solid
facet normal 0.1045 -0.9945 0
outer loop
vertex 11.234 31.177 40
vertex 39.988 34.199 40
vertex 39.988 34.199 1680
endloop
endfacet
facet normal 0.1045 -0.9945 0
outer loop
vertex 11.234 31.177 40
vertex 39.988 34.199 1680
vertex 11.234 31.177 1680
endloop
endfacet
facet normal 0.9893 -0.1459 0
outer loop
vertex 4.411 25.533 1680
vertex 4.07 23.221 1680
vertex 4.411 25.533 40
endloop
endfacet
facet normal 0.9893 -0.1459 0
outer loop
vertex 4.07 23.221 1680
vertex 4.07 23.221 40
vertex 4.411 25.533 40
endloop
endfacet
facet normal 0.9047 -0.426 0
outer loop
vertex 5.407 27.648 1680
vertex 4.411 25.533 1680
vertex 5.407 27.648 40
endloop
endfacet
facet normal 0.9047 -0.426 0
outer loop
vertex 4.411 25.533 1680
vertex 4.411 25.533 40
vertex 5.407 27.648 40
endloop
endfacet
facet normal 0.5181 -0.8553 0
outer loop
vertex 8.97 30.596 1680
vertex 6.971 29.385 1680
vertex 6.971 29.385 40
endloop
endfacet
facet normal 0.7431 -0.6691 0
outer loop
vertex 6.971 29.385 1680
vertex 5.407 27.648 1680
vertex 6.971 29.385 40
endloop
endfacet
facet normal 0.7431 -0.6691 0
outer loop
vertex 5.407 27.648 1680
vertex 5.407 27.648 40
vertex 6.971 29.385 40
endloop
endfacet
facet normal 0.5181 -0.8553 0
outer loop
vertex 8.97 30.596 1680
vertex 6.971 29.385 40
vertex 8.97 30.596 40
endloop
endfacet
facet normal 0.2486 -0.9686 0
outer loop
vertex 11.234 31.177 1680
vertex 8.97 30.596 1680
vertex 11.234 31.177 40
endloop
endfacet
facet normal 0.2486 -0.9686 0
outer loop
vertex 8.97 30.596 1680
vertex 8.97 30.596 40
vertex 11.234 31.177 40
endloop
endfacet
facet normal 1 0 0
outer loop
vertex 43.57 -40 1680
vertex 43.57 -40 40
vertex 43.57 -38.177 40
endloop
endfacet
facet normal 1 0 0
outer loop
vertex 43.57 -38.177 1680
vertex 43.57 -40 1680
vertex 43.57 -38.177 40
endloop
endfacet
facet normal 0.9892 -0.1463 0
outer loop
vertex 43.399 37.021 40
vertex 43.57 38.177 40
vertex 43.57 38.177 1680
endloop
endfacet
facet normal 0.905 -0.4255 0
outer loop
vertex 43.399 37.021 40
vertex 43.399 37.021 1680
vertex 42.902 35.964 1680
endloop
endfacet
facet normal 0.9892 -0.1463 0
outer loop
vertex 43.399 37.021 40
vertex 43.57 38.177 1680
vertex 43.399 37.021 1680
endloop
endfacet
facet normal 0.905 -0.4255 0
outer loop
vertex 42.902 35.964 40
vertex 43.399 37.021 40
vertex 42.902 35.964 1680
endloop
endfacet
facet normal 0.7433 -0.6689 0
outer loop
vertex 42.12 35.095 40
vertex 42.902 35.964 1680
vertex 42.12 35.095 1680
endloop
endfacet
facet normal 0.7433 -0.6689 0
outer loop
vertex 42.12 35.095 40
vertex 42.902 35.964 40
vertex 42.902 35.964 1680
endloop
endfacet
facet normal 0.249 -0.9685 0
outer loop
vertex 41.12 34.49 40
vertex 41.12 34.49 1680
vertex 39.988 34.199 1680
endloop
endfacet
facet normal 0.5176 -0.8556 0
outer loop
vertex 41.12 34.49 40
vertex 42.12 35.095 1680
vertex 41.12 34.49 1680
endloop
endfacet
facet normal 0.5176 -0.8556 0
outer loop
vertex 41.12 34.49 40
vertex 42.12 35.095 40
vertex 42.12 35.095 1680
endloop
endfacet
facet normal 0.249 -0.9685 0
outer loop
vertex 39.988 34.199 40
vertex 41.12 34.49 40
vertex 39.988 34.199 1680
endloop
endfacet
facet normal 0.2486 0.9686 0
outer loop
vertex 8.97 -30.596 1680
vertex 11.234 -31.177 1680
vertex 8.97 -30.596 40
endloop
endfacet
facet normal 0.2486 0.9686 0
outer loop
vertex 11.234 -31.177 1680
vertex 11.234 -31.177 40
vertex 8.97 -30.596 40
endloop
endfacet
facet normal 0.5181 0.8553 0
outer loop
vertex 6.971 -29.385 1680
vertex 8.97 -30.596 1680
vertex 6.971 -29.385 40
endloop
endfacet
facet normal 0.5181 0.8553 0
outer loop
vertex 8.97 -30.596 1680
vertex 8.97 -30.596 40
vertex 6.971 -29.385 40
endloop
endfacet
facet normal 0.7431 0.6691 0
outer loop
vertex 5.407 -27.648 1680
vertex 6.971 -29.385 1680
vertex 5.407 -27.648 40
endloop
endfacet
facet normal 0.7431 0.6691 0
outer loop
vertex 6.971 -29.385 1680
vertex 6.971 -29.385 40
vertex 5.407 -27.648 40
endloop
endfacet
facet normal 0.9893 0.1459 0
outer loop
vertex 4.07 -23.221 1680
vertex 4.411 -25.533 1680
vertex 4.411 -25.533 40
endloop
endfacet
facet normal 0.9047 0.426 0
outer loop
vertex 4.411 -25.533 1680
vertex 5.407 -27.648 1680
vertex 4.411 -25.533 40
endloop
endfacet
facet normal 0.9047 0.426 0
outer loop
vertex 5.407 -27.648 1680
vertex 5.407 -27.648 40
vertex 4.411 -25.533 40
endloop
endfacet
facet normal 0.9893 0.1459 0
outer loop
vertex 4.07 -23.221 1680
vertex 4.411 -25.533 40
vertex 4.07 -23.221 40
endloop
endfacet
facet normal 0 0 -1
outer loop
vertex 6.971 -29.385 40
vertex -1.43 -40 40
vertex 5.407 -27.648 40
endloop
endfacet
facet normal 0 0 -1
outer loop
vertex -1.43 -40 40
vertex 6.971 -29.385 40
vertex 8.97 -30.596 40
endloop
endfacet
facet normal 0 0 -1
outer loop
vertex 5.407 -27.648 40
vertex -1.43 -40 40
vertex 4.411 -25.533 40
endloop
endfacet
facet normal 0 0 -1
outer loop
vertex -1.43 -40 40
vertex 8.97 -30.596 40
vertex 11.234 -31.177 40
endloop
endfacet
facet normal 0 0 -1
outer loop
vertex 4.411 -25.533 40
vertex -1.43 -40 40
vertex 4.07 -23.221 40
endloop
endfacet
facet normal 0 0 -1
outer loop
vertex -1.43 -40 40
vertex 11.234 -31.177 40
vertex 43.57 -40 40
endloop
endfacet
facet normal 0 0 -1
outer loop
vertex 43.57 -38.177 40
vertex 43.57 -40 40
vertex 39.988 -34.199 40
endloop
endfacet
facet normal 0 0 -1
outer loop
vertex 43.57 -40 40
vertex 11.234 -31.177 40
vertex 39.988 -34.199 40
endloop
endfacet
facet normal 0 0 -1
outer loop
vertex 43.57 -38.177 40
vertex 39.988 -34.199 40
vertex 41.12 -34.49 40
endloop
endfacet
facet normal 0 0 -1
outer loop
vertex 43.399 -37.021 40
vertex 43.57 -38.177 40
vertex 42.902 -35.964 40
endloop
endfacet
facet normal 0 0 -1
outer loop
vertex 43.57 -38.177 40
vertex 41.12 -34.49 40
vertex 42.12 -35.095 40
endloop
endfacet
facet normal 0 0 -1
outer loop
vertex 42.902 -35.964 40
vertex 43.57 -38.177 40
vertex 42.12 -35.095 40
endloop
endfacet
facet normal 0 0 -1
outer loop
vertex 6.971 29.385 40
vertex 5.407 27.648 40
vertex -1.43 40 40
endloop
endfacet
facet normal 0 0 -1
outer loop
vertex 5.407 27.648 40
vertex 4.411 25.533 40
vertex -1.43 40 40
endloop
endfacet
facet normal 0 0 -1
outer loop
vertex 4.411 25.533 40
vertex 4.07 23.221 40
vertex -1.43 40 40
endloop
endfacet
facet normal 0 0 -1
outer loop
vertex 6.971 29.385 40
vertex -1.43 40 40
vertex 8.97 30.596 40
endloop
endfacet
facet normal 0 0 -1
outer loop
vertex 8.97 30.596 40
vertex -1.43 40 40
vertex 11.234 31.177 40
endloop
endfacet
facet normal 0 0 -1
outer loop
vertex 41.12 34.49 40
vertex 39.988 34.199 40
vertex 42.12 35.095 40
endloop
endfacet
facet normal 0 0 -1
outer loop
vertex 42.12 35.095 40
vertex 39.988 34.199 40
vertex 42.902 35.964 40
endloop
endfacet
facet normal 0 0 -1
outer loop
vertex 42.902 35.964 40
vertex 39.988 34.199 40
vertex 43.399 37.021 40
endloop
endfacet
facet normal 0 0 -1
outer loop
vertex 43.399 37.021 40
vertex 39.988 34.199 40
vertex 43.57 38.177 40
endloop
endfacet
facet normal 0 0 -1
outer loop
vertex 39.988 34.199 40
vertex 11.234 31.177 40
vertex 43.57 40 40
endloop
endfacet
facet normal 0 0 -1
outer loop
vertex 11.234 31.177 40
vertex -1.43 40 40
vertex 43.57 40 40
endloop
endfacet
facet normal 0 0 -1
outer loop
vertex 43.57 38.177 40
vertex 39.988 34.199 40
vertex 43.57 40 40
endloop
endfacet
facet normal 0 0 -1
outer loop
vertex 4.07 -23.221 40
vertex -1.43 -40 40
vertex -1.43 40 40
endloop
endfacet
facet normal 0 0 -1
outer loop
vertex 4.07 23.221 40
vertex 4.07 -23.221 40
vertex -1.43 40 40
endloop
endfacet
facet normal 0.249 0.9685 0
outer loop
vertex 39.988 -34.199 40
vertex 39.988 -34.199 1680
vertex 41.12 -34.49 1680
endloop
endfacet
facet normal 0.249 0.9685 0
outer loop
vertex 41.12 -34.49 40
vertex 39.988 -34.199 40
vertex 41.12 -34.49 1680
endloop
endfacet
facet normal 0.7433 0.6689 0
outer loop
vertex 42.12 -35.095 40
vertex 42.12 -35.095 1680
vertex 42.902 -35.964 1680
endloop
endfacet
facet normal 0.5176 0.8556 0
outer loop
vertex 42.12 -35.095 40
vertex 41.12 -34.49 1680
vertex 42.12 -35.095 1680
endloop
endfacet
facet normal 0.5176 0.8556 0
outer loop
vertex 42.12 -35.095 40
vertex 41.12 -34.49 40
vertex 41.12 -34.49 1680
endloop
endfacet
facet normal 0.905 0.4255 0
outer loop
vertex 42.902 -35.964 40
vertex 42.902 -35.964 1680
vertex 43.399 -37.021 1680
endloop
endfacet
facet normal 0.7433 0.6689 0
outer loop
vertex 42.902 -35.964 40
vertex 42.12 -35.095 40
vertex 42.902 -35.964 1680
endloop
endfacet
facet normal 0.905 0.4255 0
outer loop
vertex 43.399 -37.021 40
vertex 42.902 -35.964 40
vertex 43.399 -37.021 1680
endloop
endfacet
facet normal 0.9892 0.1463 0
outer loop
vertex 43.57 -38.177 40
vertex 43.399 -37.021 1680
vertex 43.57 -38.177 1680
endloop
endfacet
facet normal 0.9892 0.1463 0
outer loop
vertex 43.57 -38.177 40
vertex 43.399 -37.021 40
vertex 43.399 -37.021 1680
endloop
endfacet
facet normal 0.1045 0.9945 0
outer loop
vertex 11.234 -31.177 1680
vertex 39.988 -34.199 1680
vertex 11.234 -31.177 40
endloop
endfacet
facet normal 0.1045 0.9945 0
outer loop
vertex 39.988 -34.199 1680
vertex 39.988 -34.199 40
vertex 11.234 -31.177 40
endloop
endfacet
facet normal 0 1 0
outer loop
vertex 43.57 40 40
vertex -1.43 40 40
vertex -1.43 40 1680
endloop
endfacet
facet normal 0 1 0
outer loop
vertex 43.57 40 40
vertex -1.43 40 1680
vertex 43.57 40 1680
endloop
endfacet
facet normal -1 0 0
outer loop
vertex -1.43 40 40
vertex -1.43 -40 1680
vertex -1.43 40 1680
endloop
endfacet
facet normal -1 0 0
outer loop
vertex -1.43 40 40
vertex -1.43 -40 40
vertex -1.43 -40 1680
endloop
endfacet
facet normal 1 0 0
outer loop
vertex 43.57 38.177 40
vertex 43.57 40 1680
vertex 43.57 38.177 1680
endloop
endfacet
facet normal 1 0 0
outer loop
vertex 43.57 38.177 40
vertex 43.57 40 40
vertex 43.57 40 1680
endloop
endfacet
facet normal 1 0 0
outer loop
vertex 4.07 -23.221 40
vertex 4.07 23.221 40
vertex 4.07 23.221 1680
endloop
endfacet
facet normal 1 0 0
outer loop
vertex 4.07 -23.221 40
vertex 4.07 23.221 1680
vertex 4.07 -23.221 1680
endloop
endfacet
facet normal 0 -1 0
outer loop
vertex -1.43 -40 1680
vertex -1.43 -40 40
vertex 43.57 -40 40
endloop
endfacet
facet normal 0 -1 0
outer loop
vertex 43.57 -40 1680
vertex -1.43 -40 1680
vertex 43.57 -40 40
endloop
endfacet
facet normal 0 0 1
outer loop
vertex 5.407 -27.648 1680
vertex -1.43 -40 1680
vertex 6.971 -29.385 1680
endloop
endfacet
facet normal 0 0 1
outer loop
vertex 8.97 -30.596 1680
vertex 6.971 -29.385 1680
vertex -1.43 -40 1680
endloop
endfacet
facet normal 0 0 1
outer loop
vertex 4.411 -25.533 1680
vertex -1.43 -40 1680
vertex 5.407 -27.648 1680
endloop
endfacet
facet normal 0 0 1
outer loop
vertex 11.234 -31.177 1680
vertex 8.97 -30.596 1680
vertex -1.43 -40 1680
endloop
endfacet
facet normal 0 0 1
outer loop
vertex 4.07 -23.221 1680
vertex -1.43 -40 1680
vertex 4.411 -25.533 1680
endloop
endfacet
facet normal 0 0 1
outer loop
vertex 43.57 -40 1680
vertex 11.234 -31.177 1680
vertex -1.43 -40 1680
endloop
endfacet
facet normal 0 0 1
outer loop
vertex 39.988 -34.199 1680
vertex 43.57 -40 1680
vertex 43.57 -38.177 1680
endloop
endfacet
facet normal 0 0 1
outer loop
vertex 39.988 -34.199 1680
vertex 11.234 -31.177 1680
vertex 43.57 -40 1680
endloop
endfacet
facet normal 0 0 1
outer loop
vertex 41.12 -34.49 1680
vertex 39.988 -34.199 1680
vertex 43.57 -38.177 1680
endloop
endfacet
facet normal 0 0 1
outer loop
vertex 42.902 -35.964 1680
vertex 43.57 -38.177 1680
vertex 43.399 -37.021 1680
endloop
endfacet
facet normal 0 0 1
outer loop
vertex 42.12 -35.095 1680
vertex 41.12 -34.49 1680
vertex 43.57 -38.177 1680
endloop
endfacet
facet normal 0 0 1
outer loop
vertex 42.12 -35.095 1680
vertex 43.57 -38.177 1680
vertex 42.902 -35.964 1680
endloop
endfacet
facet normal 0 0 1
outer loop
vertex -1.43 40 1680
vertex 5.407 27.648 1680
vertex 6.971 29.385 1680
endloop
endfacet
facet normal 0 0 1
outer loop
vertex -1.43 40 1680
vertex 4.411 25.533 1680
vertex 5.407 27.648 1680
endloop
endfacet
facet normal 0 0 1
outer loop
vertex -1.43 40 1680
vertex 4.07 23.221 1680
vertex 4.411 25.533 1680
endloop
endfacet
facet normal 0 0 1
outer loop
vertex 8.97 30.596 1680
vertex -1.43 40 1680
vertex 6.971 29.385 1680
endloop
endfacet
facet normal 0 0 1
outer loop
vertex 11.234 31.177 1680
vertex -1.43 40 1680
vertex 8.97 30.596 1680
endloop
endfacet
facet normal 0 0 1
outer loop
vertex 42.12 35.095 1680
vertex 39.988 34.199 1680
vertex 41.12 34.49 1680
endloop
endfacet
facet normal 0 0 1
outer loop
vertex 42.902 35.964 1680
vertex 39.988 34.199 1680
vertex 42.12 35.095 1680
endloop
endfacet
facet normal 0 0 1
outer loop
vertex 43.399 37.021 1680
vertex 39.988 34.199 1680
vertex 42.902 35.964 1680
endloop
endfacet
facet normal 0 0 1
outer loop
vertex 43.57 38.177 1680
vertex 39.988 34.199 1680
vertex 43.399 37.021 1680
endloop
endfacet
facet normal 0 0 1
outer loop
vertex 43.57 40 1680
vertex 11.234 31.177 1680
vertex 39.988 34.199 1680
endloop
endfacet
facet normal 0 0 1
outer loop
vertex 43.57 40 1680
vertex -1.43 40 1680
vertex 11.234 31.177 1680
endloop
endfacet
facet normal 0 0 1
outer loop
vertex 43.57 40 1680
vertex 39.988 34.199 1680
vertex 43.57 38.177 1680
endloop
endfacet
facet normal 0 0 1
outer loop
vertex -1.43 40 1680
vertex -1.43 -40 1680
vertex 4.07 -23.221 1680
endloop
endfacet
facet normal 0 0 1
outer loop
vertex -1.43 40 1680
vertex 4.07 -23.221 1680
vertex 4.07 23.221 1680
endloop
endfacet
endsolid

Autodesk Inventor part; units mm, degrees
ref_plane "Начальная плоскость" through (0, 0, 40) normal (0, 0, 1) x (1, 0, 0)
ref_plane "Конечная плоскость" through (0, 0, 1680) normal (0, 0, 1) x (1, 0, 0)
sketch "Эскиз" plane through (0, 0, 0) normal (0, 0, 1) x (1, 0, 0)
  line L0 (-1.43, 0) -> (-1.43, 40)
  line L1 (-1.43, 40) -> (43.57, 40)
  line L2 (43.57, 40) -> (43.57, 38.1774)
  line L3 (39.9881, 34.1993) -> (11.2338, 31.1771)
  line L4 (4.07, 23.221) -> (4.07, 0)
  line L5 (4.07, 0) -> (-1.43, 0) construction
  line L6 (23.82, 40) -> (23.82, 32.5) construction
  line L7 (43.57, 34.5758) -> (43.57, 32.5) construction
  line L8 (43.57, 32.5) -> (23.82, 32.5) construction
  line L9 (0, 15) -> (0, -27) construction
  line L10 (-5.539, 0) -> (16.0067, 0) construction
  line L11 (-1.43, 0) -> (-1.43, -40)
  line L12 (-1.43, -40) -> (43.57, -40)
  line L13 (43.57, -40) -> (43.57, -38.1774)
  line L14 (39.9881, -34.1993) -> (11.2338, -31.1771)
  line L15 (4.07, -23.221) -> (4.07, 0)
  arc A0 (11.2338, 31.1771) -> (4.07, 23.221) centre (12.07, 23.221) ccw
  arc A1 (4.07, -23.221) -> (11.2338, -31.1771) centre (12.07, -23.221) ccw
  arc A2 (39.9881, 34.1993) -> (43.57, 38.1774) centre (39.57, 38.1774) ccw
  arc A3 (43.57, -38.1774) -> (39.9881, -34.1993) centre (39.57, -38.1774) ccw
  line L16 (0, 56) -> (0, -56) construction
  line L17 (-15.5135, 0) -> (54.308, 0) construction
  point P0 (4.07, 30.4242)
  point P1 (43.57, -34.5758)
  point P2 (4.07, -30.4242)
  point P3 (23.82, -40)
  point P4 (23.82, -32.5)
  dimension "d0" = 5.5
  dimension "d1" = 40
  dimension "d2" = 45
  dimension "d3" = 7.5
  dimension "d4" = 19.75
  dimension "d5" = 2.0758
  dimension "d23" = 8
  dimension "d24" = 4
  dimension "d25" = 1.43
extrude "Тело" add sketch "Эскиз" along normal up to surface (1640 mm away) from surface at 40
sketch "Sketch3" plane through (0, 0, 0) normal (0, 0, 1) x (1, 0, 0)
  line L0 (0, 0) -> (10, 0)
ref_plane "Work Plane3" through (0, 0, 0) normal (0, -1, 0) x (1, 0, 0)
sketch "Sketch4" plane through (0, 0, 0) normal (0, -1, 0) x (1, 0, 0)
  line L0 (-2, 40) -> (12, 40)
  line L1 (-2, 1680) -> (12, 1680)
  dimension "d29" = 1640
ref_plane "РабПлоскость4" through (-1.43, 1750, 40) normal (0, 0, -1) x (-1, 0, 0)
split "Разделение1" plane through (-1.43, 1750, 40) removes the side toward (0, 0, -1)
ref_plane "РабПлоскость5" through (-1.43, -1320, 1680) normal (0, 0, 1) x (1, 0, 0)
split "Разделение2" plane through (-1.43, -1320, 1680) removes the side toward (0, 0, 1)
equation "\"d0\" = G_T"
equation "\"d1\" = 0.5 * G_H"
equation "\"d2\" = G_W"
equation "\"d3\" = G_T1"
equation "\"d4\" = G_C"
equation "\"d23\" = G_IR"
equation "\"d24\" = G_ER"
equation "\"d25\" = ex"
equation "\"d6\" = G_L"
equation "\"G_W\" = 45"
equation "\"G_T\" = 5.5"
equation "\"G_T1\" = 7.5"
equation "\"G_NG\" = 0.105104"
equation "\"G_ER\" = 4"
equation "\"G_IR\" = 8"
equation "\"G_C\" = 19.75"
equation "\"G_L\" = d29"
equation "\"ex\" = 1.43"
equation "\"G_H\" = 80"
properties part number "ISO 657/11 - CH 80 x 8 - 1640" material "Сталь, мягкая"
